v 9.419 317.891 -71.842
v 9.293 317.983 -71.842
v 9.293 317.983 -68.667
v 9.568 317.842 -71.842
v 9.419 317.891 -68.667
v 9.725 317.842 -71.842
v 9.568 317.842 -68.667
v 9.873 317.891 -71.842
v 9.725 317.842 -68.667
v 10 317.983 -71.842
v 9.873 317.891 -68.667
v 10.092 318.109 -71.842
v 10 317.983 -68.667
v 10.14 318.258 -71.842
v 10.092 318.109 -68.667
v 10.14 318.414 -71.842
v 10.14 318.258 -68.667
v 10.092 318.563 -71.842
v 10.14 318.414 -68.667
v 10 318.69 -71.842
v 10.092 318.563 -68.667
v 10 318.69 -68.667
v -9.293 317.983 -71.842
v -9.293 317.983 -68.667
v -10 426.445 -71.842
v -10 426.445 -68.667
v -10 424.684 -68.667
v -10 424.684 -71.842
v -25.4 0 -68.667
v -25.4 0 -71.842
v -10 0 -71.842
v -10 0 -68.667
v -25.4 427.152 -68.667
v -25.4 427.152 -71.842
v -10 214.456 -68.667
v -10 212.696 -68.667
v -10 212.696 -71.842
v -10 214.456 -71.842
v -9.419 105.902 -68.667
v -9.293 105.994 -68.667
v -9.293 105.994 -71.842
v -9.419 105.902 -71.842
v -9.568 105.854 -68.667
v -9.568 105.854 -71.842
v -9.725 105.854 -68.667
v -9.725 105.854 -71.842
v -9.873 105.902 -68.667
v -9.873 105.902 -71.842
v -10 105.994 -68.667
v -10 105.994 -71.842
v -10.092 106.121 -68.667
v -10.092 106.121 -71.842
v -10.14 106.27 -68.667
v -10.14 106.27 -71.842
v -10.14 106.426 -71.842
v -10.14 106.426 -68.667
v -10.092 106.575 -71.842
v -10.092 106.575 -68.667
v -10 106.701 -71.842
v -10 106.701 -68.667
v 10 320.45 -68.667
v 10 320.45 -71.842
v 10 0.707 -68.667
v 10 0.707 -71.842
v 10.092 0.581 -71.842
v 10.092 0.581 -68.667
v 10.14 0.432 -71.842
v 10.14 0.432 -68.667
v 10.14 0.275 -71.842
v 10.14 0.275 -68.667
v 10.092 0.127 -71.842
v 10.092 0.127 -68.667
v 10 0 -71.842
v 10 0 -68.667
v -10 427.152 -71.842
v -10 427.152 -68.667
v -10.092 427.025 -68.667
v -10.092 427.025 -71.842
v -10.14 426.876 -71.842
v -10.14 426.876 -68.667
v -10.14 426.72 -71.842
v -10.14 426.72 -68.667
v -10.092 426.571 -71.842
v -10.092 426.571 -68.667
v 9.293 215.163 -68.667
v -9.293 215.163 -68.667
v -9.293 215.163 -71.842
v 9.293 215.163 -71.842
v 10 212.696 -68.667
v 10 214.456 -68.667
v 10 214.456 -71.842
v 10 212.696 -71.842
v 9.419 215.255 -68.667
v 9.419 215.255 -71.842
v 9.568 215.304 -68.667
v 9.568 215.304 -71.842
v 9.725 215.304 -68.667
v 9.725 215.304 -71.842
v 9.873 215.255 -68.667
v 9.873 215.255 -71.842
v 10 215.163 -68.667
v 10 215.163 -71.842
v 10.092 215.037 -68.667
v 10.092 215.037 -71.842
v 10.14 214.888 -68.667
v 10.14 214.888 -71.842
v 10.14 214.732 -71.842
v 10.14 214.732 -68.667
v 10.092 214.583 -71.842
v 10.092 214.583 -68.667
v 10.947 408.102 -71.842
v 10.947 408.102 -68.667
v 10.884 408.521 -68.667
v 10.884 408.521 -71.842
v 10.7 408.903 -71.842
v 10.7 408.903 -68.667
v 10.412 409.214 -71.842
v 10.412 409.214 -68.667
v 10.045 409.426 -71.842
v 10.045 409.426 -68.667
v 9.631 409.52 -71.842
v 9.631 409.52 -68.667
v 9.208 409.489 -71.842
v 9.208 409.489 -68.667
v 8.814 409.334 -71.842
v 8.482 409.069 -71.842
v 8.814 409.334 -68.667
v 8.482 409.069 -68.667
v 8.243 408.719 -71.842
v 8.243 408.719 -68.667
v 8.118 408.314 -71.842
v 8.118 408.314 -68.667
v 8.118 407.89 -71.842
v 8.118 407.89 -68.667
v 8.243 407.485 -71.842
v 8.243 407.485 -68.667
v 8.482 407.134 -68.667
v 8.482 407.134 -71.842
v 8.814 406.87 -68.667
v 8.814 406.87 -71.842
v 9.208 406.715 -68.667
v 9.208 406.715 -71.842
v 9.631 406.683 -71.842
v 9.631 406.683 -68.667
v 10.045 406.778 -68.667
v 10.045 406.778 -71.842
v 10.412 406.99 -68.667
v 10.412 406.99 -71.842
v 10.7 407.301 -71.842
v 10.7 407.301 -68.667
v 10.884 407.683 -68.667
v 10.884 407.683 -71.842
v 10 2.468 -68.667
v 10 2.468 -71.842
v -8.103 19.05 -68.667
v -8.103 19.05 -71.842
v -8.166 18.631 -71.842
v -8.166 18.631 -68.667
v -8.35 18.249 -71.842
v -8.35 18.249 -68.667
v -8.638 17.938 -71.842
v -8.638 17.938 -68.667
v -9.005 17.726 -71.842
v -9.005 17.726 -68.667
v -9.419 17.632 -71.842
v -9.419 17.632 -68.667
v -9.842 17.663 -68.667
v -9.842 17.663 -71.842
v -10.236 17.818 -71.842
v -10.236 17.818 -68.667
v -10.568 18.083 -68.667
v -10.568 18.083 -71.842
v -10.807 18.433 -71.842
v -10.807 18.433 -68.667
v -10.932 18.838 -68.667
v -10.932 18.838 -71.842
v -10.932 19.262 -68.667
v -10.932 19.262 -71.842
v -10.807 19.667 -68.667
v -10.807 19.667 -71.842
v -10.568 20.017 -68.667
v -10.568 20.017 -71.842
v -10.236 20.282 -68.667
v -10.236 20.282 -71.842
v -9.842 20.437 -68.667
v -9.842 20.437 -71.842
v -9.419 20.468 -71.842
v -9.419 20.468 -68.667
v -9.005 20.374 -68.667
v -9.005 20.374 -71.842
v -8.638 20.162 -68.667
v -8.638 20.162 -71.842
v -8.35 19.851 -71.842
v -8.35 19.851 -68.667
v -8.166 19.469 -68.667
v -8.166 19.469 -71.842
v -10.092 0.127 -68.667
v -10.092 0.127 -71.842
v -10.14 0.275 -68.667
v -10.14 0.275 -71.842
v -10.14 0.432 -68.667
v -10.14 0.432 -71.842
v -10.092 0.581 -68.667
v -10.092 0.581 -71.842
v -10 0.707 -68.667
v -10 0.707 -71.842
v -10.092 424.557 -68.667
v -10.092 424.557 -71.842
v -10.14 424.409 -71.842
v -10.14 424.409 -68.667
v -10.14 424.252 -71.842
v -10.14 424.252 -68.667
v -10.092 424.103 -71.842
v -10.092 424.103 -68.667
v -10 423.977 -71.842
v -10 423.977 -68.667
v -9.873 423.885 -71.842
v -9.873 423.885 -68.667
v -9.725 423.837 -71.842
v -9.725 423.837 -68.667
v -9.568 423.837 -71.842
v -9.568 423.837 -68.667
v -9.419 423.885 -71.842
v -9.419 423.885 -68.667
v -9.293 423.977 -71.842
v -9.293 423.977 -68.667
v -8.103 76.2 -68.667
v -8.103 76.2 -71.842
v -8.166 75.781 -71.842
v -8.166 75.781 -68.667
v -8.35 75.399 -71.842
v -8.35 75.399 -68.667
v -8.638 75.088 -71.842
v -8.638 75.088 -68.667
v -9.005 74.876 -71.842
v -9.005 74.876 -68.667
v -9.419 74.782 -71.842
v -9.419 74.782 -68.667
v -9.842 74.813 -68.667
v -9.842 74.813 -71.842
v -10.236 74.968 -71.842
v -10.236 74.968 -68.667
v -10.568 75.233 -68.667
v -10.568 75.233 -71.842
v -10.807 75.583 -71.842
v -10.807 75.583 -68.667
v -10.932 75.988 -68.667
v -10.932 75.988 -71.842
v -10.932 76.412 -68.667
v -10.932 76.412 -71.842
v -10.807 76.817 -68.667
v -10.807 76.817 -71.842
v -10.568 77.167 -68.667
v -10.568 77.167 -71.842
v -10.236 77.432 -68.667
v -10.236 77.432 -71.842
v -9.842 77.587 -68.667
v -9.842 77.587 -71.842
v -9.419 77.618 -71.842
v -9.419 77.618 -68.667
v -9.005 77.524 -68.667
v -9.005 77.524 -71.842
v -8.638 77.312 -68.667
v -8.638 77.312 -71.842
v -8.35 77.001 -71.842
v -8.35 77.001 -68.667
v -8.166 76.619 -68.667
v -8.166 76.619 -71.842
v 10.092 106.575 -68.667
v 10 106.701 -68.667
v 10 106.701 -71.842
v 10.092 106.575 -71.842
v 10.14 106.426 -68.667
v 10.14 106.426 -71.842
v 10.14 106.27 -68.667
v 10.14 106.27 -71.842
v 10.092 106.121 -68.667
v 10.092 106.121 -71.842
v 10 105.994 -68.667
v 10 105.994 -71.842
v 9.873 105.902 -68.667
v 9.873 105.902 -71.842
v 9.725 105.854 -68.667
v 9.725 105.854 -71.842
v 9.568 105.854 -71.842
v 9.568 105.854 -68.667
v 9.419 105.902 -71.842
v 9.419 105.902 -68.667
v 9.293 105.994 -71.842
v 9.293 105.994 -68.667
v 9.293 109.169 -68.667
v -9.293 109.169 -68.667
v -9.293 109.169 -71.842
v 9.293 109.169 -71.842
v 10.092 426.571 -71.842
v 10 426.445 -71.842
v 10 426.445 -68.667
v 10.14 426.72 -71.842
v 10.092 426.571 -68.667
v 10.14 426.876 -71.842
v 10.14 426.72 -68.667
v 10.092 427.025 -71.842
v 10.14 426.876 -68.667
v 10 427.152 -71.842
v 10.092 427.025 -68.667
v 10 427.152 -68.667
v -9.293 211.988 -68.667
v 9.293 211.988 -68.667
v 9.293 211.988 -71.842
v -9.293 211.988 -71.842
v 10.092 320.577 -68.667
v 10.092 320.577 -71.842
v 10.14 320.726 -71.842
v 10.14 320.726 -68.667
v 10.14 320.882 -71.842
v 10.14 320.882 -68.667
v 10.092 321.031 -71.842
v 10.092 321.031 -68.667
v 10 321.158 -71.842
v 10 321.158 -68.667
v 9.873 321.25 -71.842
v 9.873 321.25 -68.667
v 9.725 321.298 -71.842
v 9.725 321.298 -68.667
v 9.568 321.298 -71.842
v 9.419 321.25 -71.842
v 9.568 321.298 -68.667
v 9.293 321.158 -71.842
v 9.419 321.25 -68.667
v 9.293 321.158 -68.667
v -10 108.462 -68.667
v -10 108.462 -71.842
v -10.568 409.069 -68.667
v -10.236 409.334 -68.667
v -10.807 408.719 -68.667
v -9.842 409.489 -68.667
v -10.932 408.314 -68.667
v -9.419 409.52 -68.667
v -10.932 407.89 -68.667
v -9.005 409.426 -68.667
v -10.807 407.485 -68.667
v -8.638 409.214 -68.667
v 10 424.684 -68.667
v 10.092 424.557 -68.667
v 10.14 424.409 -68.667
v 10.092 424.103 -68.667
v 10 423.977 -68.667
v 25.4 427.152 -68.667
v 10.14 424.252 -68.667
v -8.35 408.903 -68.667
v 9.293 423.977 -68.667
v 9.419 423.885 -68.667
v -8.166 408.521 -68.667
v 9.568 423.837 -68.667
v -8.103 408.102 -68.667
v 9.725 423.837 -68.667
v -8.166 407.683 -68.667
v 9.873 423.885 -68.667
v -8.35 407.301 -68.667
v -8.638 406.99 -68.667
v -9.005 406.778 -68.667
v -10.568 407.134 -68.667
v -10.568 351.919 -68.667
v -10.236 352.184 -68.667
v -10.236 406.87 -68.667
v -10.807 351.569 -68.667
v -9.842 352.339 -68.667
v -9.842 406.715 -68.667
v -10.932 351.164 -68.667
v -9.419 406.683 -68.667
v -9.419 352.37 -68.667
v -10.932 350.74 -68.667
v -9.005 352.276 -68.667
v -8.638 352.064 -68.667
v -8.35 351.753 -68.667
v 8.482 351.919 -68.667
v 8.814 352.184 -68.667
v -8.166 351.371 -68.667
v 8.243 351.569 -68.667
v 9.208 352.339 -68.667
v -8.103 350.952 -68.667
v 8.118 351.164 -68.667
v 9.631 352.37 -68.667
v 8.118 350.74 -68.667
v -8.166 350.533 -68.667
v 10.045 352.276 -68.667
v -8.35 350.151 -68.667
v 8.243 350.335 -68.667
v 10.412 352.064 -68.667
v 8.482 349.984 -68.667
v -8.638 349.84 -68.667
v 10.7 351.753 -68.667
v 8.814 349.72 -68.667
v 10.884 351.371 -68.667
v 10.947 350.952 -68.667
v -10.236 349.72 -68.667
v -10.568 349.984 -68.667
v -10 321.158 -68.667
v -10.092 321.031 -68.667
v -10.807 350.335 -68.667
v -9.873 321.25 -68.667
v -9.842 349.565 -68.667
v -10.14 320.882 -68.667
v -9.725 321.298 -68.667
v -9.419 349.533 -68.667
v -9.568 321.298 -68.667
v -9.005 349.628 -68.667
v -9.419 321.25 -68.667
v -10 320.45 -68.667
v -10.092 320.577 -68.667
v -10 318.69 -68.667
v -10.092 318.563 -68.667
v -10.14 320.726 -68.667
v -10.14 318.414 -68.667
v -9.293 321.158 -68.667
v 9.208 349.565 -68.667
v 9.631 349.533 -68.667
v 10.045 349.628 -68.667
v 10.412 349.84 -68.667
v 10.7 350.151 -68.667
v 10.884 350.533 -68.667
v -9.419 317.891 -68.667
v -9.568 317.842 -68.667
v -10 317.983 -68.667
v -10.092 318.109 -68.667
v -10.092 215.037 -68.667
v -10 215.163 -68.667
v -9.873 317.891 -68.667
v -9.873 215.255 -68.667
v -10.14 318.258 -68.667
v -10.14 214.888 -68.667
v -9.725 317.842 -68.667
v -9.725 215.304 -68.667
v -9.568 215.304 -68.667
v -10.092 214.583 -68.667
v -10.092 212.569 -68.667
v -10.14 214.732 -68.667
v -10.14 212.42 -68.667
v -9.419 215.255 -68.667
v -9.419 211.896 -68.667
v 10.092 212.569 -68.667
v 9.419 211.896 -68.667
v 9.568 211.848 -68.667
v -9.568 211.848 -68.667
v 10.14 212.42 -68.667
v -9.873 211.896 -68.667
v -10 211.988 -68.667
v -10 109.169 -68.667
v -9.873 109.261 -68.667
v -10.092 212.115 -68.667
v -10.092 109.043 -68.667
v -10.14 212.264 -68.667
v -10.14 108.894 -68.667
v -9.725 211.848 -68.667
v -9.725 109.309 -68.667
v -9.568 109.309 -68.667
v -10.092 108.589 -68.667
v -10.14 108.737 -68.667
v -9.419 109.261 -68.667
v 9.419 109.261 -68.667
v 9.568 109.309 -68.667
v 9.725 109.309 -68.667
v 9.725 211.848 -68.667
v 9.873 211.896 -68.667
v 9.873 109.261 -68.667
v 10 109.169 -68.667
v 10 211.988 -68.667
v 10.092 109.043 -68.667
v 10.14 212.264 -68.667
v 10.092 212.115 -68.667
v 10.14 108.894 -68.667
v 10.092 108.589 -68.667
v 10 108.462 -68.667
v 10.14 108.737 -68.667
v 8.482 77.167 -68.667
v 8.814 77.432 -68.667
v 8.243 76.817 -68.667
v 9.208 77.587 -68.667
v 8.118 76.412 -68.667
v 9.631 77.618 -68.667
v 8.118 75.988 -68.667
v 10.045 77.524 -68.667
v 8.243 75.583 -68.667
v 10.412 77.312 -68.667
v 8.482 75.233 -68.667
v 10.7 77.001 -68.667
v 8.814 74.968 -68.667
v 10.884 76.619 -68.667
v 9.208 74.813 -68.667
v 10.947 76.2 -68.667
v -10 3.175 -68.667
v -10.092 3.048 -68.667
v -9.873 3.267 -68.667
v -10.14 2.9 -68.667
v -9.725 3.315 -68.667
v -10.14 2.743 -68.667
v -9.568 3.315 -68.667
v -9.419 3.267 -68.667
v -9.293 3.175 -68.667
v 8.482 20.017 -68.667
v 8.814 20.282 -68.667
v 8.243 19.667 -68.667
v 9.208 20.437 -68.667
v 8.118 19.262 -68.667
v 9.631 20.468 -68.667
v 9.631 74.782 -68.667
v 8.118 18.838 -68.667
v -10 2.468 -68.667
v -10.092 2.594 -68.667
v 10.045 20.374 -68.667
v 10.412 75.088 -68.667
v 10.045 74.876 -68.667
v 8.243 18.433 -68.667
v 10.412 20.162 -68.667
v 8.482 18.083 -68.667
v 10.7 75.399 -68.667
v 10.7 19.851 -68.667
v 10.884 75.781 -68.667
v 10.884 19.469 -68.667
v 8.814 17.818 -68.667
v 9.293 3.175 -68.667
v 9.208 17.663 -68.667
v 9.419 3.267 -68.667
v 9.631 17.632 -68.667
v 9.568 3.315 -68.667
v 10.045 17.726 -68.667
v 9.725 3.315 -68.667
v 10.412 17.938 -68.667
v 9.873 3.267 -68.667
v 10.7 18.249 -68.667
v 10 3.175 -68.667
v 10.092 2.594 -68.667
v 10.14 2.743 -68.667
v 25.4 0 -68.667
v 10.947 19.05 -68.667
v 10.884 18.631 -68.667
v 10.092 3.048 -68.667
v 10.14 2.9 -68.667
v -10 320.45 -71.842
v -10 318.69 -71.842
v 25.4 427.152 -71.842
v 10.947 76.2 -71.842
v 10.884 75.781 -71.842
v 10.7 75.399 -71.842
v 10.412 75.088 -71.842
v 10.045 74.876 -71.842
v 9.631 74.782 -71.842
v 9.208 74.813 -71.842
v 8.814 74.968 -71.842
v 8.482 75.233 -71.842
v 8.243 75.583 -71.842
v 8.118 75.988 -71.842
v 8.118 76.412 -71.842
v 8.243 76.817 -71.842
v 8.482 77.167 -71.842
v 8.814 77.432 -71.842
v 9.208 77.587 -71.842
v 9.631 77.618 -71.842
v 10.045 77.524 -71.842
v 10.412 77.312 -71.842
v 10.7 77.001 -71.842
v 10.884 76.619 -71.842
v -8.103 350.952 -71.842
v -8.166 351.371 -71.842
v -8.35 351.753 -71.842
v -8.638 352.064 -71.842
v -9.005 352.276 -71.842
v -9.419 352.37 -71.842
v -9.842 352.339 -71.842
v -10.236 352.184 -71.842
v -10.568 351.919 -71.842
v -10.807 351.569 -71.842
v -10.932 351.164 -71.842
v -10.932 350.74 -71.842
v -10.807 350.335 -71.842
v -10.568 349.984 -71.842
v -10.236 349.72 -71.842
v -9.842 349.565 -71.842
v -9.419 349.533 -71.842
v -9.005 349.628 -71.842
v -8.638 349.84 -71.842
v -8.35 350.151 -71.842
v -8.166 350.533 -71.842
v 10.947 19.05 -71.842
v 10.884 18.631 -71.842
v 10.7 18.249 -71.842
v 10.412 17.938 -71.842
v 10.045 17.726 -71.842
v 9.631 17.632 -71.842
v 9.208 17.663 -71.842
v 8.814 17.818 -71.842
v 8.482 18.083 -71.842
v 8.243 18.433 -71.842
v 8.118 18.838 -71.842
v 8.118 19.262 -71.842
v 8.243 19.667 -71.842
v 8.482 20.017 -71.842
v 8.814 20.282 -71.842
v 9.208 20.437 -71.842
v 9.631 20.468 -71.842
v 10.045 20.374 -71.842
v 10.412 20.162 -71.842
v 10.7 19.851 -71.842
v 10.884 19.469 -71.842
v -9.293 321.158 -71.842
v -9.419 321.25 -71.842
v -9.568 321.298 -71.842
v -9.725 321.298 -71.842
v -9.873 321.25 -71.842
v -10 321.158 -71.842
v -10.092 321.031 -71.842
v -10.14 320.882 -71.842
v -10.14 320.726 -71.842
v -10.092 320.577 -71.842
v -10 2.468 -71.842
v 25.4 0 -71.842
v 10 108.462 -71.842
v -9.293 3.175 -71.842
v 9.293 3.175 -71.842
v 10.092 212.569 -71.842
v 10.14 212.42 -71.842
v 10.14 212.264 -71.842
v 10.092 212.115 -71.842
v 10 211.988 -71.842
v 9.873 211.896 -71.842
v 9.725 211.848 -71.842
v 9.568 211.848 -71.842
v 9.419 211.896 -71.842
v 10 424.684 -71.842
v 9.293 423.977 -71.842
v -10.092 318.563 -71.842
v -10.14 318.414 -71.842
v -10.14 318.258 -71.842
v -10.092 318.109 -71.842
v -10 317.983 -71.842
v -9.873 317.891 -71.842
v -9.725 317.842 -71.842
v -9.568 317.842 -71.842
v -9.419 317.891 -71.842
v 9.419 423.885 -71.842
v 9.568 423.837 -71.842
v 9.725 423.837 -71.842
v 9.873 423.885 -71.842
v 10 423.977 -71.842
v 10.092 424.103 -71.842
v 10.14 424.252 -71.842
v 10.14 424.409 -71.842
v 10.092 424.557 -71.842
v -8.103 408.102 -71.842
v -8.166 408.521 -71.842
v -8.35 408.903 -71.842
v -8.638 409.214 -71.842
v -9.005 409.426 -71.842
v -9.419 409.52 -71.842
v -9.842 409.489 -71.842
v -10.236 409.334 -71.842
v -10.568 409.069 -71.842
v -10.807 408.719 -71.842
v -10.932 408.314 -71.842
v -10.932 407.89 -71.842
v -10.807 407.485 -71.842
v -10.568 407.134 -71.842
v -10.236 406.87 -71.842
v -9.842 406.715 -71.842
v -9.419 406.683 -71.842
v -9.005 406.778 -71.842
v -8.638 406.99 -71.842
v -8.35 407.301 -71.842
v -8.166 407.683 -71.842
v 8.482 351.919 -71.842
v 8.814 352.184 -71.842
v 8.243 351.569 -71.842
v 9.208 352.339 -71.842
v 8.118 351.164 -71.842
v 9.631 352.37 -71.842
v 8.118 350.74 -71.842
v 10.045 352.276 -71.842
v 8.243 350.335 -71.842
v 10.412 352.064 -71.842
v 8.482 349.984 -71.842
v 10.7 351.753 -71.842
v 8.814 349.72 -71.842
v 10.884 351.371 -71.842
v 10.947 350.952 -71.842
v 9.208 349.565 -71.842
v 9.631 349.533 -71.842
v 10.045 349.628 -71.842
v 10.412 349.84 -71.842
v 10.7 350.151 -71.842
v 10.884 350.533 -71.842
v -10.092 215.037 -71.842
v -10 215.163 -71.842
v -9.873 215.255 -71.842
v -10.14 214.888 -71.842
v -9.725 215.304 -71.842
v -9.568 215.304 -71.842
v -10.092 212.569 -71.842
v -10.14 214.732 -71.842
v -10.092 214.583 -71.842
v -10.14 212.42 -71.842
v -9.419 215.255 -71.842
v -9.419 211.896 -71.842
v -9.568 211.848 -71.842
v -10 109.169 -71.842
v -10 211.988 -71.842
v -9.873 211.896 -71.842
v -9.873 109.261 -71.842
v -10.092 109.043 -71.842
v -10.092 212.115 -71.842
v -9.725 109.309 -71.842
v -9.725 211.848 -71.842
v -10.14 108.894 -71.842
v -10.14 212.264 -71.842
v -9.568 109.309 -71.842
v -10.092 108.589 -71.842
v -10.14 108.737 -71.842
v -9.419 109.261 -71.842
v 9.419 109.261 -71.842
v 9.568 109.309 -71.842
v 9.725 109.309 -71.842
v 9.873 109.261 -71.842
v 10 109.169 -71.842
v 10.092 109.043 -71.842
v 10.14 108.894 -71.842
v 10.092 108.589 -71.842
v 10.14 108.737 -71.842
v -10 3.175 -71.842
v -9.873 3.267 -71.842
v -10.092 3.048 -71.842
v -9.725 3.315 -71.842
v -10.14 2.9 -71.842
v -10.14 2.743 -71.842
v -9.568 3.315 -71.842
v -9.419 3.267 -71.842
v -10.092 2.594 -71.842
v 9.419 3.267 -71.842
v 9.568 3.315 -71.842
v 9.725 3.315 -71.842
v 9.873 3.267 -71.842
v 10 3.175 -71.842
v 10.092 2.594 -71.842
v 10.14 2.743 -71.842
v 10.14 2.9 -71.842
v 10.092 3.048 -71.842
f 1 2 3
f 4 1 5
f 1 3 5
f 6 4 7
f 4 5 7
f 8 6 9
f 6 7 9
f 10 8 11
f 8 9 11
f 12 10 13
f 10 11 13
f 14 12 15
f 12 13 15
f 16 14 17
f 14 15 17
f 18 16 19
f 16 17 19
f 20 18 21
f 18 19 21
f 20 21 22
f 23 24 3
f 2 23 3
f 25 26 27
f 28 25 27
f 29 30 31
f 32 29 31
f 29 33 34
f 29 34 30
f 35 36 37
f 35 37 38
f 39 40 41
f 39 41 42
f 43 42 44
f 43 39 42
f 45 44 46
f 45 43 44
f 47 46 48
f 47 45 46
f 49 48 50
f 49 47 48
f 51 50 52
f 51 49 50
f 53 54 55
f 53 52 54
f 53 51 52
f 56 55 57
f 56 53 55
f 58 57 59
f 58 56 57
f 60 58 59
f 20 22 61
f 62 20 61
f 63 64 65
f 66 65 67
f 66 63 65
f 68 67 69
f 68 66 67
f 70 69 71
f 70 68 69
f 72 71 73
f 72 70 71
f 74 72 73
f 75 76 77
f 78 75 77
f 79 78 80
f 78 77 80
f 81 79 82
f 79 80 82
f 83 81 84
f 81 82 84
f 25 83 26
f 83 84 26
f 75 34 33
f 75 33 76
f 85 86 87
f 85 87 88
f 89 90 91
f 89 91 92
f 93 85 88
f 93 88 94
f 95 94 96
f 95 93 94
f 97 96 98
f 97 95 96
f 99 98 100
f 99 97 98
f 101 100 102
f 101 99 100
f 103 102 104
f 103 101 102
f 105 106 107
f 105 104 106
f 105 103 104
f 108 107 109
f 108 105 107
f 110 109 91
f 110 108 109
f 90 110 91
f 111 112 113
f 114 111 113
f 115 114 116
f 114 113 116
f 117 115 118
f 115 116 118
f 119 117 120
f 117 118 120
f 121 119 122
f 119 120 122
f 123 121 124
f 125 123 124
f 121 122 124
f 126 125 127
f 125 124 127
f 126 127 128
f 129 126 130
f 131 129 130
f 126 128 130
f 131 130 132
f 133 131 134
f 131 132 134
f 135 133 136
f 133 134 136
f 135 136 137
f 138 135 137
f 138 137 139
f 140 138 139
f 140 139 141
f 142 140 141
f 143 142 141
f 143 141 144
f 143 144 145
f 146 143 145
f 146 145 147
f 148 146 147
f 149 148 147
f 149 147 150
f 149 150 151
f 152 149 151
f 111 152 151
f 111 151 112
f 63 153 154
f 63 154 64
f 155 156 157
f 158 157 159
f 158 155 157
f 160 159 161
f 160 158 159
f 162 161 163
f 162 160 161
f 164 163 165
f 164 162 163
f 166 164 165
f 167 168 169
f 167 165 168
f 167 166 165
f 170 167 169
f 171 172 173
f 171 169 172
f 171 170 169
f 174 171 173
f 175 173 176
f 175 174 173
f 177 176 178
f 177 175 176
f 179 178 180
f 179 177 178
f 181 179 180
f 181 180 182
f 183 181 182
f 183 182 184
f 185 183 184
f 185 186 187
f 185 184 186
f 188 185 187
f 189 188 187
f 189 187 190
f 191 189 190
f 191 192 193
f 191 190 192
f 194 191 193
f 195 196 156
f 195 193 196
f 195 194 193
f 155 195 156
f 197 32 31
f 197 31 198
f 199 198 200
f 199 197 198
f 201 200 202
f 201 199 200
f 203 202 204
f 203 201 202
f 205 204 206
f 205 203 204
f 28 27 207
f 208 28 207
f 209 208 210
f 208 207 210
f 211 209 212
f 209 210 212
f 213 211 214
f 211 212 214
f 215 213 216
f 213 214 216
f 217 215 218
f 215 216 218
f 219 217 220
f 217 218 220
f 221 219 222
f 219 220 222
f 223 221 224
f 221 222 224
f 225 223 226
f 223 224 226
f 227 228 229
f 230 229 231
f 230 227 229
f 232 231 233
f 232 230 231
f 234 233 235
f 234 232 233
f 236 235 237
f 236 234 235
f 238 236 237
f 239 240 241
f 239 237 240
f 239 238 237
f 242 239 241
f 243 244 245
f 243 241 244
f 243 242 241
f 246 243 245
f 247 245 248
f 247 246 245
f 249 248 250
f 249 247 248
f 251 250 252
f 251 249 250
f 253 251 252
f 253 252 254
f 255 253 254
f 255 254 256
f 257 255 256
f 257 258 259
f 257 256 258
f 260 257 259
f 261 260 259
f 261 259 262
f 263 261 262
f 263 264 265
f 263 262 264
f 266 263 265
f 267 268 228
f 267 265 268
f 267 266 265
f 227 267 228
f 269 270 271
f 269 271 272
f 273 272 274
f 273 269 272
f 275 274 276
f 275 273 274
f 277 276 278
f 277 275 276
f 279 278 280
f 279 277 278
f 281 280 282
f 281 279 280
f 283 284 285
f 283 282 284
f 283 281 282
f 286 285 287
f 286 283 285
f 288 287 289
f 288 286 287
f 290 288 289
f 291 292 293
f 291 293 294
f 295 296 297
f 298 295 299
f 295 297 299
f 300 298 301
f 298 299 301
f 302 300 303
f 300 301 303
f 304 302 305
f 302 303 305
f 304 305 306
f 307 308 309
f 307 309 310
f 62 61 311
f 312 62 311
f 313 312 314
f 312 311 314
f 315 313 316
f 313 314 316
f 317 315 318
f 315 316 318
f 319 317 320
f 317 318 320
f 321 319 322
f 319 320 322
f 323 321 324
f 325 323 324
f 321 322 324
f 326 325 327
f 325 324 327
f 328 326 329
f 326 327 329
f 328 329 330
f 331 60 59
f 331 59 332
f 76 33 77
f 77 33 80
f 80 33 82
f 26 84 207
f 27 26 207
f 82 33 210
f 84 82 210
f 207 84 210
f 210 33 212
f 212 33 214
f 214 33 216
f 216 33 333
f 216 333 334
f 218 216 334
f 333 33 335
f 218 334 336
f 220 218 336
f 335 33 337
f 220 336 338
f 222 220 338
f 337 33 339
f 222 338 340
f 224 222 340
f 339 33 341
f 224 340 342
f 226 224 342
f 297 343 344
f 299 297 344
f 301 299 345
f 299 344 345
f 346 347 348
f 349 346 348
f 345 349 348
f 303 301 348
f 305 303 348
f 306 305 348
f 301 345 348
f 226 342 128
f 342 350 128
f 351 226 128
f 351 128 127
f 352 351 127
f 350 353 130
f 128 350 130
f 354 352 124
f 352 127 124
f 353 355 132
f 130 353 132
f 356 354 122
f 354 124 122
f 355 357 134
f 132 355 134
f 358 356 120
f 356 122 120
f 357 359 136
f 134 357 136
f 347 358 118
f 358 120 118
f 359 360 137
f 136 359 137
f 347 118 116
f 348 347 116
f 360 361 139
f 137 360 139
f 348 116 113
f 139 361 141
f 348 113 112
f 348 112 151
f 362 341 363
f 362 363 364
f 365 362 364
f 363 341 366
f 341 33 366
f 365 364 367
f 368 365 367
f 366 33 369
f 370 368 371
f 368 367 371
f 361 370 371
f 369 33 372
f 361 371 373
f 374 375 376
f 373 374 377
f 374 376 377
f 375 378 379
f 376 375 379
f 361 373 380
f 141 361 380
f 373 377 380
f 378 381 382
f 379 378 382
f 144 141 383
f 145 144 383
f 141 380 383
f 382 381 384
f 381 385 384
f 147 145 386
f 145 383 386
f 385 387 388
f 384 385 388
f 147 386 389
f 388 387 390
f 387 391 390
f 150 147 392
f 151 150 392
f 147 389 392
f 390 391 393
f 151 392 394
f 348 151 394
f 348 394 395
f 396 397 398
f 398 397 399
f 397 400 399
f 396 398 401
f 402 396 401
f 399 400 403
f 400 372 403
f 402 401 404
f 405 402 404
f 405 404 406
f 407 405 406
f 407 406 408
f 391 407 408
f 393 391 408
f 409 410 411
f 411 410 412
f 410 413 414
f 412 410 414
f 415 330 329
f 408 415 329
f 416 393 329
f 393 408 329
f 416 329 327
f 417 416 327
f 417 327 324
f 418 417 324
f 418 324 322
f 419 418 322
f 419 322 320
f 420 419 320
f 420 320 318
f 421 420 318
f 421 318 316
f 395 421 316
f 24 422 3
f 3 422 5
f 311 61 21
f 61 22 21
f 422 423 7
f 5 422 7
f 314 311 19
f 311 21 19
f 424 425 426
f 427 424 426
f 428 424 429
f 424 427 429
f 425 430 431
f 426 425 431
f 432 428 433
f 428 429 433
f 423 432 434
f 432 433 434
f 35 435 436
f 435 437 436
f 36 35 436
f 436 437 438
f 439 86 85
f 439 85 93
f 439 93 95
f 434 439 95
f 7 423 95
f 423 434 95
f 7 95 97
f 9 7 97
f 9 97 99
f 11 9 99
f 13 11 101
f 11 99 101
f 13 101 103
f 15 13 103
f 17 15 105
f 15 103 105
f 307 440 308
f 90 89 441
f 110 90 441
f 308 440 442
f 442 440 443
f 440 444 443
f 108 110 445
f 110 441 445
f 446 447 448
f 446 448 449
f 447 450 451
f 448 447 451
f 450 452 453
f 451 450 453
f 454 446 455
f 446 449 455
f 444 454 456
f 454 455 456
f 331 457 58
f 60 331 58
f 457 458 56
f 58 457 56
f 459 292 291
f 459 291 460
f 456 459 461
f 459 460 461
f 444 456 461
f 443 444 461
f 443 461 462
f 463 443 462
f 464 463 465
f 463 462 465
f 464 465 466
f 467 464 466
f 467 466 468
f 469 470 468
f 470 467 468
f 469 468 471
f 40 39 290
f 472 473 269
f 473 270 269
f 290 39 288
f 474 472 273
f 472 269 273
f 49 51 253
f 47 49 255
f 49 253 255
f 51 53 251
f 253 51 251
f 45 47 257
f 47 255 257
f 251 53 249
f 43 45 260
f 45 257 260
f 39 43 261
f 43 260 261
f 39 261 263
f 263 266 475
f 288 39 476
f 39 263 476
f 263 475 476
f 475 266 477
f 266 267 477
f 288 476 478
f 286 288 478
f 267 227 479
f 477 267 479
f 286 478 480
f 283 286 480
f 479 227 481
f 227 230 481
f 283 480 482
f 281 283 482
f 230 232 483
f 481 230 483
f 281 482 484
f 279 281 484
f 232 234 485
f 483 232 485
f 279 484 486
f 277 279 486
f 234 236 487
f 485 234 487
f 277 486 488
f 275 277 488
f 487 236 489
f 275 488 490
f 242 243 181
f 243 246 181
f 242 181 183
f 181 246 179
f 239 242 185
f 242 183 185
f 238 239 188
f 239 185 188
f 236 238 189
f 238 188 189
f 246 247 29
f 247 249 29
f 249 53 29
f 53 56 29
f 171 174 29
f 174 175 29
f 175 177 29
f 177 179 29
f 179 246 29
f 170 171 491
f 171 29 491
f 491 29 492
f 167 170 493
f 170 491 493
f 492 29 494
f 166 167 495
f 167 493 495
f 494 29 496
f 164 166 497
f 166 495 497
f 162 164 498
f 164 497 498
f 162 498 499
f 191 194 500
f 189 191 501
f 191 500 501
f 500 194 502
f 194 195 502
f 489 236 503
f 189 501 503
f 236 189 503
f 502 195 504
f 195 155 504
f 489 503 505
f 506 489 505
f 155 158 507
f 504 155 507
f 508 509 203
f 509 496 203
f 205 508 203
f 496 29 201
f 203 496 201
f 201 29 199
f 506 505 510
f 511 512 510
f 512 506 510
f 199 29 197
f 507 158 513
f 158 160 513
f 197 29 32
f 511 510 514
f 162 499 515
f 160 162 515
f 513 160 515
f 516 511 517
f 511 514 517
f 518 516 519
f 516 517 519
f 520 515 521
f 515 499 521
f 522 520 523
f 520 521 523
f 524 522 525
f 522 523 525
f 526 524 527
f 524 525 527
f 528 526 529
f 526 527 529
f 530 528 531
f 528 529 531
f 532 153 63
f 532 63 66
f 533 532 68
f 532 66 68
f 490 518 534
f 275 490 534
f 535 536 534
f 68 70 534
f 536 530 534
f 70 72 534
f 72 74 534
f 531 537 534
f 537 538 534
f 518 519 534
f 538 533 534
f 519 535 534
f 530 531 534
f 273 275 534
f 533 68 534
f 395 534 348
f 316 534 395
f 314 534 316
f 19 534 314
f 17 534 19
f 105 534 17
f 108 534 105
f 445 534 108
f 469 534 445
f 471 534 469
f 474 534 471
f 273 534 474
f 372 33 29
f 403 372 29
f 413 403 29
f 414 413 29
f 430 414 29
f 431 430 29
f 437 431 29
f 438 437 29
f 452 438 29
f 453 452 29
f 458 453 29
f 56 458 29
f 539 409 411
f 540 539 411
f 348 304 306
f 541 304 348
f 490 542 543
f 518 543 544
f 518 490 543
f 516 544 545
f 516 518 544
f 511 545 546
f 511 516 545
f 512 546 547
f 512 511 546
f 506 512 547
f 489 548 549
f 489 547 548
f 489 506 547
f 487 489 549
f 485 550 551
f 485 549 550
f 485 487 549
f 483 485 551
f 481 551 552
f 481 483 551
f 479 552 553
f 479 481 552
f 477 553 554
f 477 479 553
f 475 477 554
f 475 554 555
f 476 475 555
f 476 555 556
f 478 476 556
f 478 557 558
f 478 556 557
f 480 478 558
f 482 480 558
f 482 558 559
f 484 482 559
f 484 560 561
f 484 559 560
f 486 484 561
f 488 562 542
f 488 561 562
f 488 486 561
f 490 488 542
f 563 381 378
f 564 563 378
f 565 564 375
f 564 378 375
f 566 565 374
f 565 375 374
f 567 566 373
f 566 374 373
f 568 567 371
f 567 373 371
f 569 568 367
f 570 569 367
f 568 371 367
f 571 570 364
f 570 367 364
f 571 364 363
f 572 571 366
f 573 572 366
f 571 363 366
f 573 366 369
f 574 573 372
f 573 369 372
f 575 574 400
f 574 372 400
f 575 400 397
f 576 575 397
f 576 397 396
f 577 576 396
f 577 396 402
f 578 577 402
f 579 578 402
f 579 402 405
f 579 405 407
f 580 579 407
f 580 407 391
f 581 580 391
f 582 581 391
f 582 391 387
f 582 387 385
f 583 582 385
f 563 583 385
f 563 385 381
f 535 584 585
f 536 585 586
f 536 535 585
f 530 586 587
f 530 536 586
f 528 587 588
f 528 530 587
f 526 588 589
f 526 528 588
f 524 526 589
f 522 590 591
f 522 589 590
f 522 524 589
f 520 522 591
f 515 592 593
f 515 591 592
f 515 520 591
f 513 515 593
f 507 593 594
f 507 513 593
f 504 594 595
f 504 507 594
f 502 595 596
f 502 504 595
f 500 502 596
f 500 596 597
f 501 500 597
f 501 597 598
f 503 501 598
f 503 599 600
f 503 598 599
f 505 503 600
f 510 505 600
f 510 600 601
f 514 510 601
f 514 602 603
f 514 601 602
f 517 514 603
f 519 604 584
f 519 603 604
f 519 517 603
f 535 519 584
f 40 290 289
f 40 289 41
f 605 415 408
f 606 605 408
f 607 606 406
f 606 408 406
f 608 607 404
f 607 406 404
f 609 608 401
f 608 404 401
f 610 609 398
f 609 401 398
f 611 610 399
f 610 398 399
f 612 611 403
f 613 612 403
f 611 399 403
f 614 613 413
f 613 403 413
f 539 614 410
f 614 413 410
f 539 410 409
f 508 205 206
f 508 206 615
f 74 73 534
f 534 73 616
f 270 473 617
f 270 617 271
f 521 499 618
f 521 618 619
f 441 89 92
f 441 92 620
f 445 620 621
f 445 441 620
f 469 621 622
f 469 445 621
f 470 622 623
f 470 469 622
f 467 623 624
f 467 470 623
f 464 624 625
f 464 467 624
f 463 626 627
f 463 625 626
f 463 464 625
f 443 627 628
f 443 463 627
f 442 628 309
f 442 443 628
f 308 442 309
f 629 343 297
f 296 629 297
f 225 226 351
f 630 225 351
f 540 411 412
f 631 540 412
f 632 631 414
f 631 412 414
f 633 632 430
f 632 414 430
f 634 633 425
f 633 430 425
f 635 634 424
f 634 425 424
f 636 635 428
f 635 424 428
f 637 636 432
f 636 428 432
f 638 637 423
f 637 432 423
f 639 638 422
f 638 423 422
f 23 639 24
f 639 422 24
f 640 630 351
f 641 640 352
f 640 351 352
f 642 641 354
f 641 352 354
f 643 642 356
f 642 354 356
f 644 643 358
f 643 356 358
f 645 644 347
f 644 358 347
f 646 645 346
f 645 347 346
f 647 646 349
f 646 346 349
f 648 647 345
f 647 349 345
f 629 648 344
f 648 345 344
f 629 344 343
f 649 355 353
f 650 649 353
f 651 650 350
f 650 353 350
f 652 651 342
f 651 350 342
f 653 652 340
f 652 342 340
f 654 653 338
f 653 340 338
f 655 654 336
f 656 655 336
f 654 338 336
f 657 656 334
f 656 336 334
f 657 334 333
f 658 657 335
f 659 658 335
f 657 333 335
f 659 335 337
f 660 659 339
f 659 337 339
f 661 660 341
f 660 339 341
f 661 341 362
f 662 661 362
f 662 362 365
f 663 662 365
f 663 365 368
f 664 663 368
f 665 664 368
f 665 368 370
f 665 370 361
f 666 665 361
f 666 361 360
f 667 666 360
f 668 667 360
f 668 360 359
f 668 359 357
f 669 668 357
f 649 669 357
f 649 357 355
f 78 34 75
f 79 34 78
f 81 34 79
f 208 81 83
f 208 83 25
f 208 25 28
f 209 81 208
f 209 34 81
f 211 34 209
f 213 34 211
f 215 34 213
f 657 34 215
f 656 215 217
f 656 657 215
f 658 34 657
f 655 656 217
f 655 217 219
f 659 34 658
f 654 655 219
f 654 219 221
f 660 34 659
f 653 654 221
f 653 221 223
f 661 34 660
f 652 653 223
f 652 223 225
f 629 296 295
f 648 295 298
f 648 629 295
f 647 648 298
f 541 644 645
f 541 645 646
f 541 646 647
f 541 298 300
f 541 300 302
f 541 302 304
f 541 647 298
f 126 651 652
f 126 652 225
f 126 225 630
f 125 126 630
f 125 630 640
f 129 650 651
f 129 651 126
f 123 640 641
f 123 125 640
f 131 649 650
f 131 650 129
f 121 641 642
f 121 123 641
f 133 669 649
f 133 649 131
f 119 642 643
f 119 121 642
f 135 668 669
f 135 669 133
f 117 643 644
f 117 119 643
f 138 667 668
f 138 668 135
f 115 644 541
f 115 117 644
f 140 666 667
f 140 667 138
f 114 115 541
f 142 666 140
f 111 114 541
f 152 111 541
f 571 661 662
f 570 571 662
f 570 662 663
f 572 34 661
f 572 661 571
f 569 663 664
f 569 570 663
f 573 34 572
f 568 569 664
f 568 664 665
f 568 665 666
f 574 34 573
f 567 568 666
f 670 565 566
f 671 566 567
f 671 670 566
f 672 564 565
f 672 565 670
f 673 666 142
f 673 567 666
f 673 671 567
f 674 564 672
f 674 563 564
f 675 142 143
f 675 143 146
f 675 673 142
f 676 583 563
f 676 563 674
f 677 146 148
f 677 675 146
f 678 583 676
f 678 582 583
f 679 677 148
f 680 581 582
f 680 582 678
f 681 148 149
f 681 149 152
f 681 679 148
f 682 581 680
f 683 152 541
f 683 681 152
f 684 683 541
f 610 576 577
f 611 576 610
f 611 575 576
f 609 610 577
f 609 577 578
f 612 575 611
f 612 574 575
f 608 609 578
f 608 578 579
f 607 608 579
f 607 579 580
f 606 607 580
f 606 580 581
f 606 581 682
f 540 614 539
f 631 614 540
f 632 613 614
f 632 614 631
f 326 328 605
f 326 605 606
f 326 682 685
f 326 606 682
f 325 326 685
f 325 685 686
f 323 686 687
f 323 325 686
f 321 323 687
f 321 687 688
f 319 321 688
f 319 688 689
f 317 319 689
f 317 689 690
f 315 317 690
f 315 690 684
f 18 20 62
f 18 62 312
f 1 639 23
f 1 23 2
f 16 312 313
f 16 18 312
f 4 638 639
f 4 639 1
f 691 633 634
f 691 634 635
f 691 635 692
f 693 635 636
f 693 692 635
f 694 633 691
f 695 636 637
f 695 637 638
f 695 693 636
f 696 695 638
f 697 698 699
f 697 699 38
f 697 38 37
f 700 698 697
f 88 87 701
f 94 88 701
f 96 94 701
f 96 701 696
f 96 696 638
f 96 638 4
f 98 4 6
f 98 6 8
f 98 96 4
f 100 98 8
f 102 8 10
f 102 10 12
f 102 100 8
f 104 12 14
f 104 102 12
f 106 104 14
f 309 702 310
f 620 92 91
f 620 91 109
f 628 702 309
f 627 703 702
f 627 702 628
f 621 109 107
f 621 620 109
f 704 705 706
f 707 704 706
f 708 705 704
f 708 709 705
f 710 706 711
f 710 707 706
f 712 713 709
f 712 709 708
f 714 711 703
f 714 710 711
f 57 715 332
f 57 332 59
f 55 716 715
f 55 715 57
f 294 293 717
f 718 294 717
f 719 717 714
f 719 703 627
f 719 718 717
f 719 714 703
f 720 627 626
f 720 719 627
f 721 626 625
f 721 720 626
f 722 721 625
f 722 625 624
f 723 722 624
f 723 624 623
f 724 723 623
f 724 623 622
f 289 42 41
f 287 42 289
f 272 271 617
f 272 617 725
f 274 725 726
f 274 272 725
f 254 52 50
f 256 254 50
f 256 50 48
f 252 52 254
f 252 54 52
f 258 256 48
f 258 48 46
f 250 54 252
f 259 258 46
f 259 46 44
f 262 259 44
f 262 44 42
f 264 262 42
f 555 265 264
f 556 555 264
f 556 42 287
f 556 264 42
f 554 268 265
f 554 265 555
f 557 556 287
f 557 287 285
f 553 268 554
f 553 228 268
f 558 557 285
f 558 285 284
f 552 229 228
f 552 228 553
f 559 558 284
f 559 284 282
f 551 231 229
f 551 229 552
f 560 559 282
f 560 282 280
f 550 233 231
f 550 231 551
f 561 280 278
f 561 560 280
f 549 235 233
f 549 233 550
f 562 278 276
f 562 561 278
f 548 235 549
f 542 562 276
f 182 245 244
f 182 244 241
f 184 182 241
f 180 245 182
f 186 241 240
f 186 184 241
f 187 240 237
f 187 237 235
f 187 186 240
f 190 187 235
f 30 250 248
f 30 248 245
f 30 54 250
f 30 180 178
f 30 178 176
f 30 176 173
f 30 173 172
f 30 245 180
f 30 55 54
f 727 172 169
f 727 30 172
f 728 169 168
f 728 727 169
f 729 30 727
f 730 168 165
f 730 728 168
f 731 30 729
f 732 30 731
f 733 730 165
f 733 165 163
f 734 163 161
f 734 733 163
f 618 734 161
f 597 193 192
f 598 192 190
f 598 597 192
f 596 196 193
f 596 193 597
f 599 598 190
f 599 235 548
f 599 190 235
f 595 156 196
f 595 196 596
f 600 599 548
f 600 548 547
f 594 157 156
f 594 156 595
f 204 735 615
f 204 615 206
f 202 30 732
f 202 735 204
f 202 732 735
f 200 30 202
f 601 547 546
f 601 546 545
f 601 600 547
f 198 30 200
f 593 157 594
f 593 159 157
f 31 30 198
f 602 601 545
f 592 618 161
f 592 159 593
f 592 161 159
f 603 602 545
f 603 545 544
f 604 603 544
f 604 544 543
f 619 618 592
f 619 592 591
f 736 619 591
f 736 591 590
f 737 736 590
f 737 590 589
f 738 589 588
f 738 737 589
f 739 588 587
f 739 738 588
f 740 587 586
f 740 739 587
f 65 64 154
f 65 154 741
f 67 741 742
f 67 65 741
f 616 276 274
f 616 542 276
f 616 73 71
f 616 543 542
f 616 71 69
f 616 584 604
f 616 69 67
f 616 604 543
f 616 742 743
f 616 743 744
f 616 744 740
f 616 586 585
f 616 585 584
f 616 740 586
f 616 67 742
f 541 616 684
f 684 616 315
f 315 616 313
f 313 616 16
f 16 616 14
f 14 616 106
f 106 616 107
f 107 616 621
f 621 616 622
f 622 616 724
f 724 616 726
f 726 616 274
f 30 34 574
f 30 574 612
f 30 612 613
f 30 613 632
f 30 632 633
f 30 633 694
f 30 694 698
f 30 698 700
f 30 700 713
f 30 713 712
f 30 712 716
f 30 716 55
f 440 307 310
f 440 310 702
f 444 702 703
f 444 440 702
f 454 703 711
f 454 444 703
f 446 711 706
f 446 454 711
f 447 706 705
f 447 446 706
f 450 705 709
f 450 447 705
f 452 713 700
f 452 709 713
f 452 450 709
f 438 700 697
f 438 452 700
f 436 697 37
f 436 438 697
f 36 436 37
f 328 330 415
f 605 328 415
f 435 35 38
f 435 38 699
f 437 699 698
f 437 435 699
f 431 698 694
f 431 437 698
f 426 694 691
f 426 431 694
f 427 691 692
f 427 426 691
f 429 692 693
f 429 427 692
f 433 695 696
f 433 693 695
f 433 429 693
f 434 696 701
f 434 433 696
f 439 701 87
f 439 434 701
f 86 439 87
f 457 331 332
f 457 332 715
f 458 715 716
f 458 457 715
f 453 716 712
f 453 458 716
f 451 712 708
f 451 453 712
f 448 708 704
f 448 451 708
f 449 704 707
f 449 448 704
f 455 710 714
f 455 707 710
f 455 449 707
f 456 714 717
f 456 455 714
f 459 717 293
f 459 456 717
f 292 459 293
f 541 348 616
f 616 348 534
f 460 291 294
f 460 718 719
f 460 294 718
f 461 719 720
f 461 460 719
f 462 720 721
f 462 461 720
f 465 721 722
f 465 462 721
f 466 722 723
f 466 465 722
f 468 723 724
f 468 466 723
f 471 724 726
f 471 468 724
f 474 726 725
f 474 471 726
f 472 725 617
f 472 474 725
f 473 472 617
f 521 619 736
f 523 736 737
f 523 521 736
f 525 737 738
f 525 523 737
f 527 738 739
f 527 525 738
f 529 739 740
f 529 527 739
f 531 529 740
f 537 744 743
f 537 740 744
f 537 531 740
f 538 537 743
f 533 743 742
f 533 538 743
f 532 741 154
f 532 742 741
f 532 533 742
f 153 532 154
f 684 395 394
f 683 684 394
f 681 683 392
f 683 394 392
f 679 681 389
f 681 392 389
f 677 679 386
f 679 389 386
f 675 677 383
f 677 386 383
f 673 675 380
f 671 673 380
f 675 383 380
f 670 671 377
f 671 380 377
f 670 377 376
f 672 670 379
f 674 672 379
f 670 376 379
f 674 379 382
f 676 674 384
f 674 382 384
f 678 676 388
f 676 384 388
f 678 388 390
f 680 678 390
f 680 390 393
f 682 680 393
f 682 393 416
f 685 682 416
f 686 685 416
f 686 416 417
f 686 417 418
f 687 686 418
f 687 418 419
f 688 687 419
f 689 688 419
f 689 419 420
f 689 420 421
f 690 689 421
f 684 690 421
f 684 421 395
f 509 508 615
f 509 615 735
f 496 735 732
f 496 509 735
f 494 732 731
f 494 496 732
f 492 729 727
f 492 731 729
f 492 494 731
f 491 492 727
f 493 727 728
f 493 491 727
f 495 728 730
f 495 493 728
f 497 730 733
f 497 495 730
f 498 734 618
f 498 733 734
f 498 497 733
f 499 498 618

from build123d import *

# Parameters (mm, degrees)
SKETCH1_W           = 50.8
SKETCH1_H           = 3.175
BOSS_EXTRUDE1_DEPTH = 427.1518
SKETCH4_R           = 1.4224
CUT_EXTRUDE2_DEPTH  = 5.08
SKETCH5_W           = 12.58267919
SKETCH5_H           = 101.029760921
BOSS_EXTRUDE2_DEPTH = 3.175
SKETCH6_W           = 7.546607927
SKETCH6_H           = 108.671154153
SKETCH6_W_2         = 9.055929513
BOSS_EXTRUDE3_DEPTH = 3.175
SKETCH7_W           = 50.8
SKETCH7_H           = 16.51
BOSS_EXTRUDE4_DEPTH = 3.175
SKETCH8_W           = 50.8
SKETCH8_H           = 51.188017092
BOSS_EXTRUDE5_DEPTH = 3.175
SKETCH9_W           = 50.8
SKETCH9_H           = 70.169066632
BOSS_EXTRUDE6_DEPTH = 3.175
CUT_EXTRUDE3_DEPTH  = 428.918100655


with BuildPart() as part:
    # Sketch1 → Boss-Extrude1 (new body)
    with BuildSketch(Plane(origin=(0, 0, 0), x_dir=(1, 0, 0), z_dir=(0, 1, 0))):
        with Locations((0, 70.254548969)):
            Rectangle(SKETCH1_W, SKETCH1_H)
    extrude(amount=BOSS_EXTRUDE1_DEPTH)

    # Sketch4 → Cut-Extrude2 (cut)
    with BuildSketch(Plane.XY.offset(-68.667048969)):
        with Locations((-3.175, 376.3518)):
            Circle(SKETCH4_R)
        with Locations((-9.525, 376.3518)):
            Circle(SKETCH4_R)
        with Locations((-9.525, 370.0018)):
            Circle(SKETCH4_R)
        with Locations((-9.525, 363.6518)):
            Circle(SKETCH4_R)
        with Locations((-9.525, 357.3018)):
            Circle(SKETCH4_R)
        with Locations((-9.525, 350.9518)):
            Circle(SKETCH4_R)
        with Locations((-9.525, 344.6018)):
            Circle(SKETCH4_R)
        with Locations((-9.525, 338.2518)):
            Circle(SKETCH4_R)
        with Locations((-9.525, 331.9018)):
            Circle(SKETCH4_R)
        with Locations((-9.525, 325.5518)):
            Circle(SKETCH4_R)
        with Locations((-9.525, 319.2018)):
            Circle(SKETCH4_R)
        with Locations((-9.525, 312.8518)):
            Circle(SKETCH4_R)
        with Locations((-9.525, 306.5018)):
            Circle(SKETCH4_R)
        with Locations((-9.525, 300.1518)):
            Circle(SKETCH4_R)
        with Locations((-9.525, 293.8018)):
            Circle(SKETCH4_R)
        with Locations((-9.525, 287.4518)):
            Circle(SKETCH4_R)
        with Locations((-9.525, 281.1018)):
            Circle(SKETCH4_R)
        with Locations((-3.175, 370.0018)):
            Circle(SKETCH4_R)
        with Locations((-3.175, 363.6518)):
            Circle(SKETCH4_R)
        with Locations((-3.175, 357.3018)):
            Circle(SKETCH4_R)
        with Locations((-3.175, 350.9518)):
            Circle(SKETCH4_R)
        with Locations((-3.175, 344.6018)):
            Circle(SKETCH4_R)
        with Locations((-3.175, 338.2518)):
            Circle(SKETCH4_R)
        with Locations((-3.175, 331.9018)):
            Circle(SKETCH4_R)
        with Locations((-3.175, 325.5518)):
            Circle(SKETCH4_R)
        with Locations((-3.175, 319.2018)):
            Circle(SKETCH4_R)
        with Locations((-3.175, 312.8518)):
            Circle(SKETCH4_R)
        with Locations((-3.175, 306.5018)):
            Circle(SKETCH4_R)
        with Locations((-3.175, 300.1518)):
            Circle(SKETCH4_R)
        with Locations((-3.175, 293.8018)):
            Circle(SKETCH4_R)
        with Locations((-3.175, 287.4518)):
            Circle(SKETCH4_R)
        with Locations((-3.175, 281.1018)):
            Circle(SKETCH4_R)
        with Locations((3.175, 281.1018)):
            Circle(SKETCH4_R)
        with Locations((3.175, 287.4518)):
            Circle(SKETCH4_R)
        with Locations((3.175, 293.8018)):
            Circle(SKETCH4_R)
        with Locations((3.175, 300.1518)):
            Circle(SKETCH4_R)
        with Locations((3.175, 306.5018)):
            Circle(SKETCH4_R)
        with Locations((3.175, 312.8518)):
            Circle(SKETCH4_R)
        with Locations((3.175, 319.2018)):
            Circle(SKETCH4_R)
        with Locations((3.175, 325.5518)):
            Circle(SKETCH4_R)
        with Locations((3.175, 331.9018)):
            Circle(SKETCH4_R)
        with Locations((3.175, 338.2518)):
            Circle(SKETCH4_R)
        with Locations((3.175, 344.6018)):
            Circle(SKETCH4_R)
        with Locations((3.175, 350.9518)):
            Circle(SKETCH4_R)
        with Locations((3.175, 357.3018)):
            Circle(SKETCH4_R)
        with Locations((3.175, 363.6518)):
            Circle(SKETCH4_R)
        with Locations((3.175, 370.0018)):
            Circle(SKETCH4_R)
        with Locations((9.525, 281.1018)):
            Circle(SKETCH4_R)
        with Locations((9.525, 287.4518)):
            Circle(SKETCH4_R)
        with Locations((9.525, 293.8018)):
            Circle(SKETCH4_R)
        with Locations((9.525, 300.1518)):
            Circle(SKETCH4_R)
        with Locations((9.525, 306.5018)):
            Circle(SKETCH4_R)
        with Locations((9.525, 312.8518)):
            Circle(SKETCH4_R)
        with Locations((9.525, 319.2018)):
            Circle(SKETCH4_R)
        with Locations((9.525, 325.5518)):
            Circle(SKETCH4_R)
        with Locations((9.525, 331.9018)):
            Circle(SKETCH4_R)
        with Locations((9.525, 338.2518)):
            Circle(SKETCH4_R)
        with Locations((9.525, 344.6018)):
            Circle(SKETCH4_R)
        with Locations((9.525, 350.9518)):
            Circle(SKETCH4_R)
        with Locations((9.525, 357.3018)):
            Circle(SKETCH4_R)
        with Locations((9.525, 363.6518)):
            Circle(SKETCH4_R)
        with Locations((9.525, 370.0018)):
            Circle(SKETCH4_R)
        with Locations((9.525, 376.3518)):
            Circle(SKETCH4_R)
        with Locations((3.175, 376.3518)):
            Circle(SKETCH4_R)
        with Locations((-9.525, 382.7018)):
            Circle(SKETCH4_R)
        with Locations((9.525, 382.7018)):
            Circle(SKETCH4_R)
        with Locations((-9.525, 389.0518)):
            Circle(SKETCH4_R)
        with Locations((9.525, 389.0518)):
            Circle(SKETCH4_R)
        with Locations((-9.525, 395.4018)):
            Circle(SKETCH4_R)
        with Locations((9.525, 395.4018)):
            Circle(SKETCH4_R)
        with Locations((-9.525, 401.7518)):
            Circle(SKETCH4_R)
        with Locations((9.525, 401.7518)):
            Circle(SKETCH4_R)
        with Locations((-9.525, 408.1018)):
            Circle(SKETCH4_R)
        with Locations((9.525, 408.1018)):
            Circle(SKETCH4_R)
        with Locations((-9.525, 414.4518)):
            Circle(SKETCH4_R)
        with Locations((9.525, 414.4518)):
            Circle(SKETCH4_R)
    cut_extrude2 = extrude(amount=-CUT_EXTRUDE2_DEPTH, mode=Mode.SUBTRACT)

    # Sketch5 → Boss-Extrude2 (add)
    with BuildSketch(Plane.XY.offset(-68.667048969)):
        with Locations((-0.175223229, 328.362881378)):
            Rectangle(SKETCH5_W, SKETCH5_H)
    boss_extrude2 = extrude(amount=-BOSS_EXTRUDE2_DEPTH)

    # Sketch6 → Boss-Extrude3 (add)
    with BuildSketch(Plane.XY.offset(-68.667048969)):
        with Locations((-16.484092579, 326.705642943)):
            Rectangle(SKETCH6_W, SKETCH6_H)
        with Locations((16.9725359, 326.705642943)):
            Rectangle(SKETCH6_W_2, SKETCH6_H)
    boss_extrude3 = extrude(amount=-BOSS_EXTRUDE3_DEPTH)

    # Sketch7 → Boss-Extrude4 (add)
    with BuildSketch(Plane.XY.offset(-68.667048969)):
        with Locations((0, 418.8968)):
            Rectangle(SKETCH7_W, SKETCH7_H)
    boss_extrude4 = extrude(amount=-BOSS_EXTRUDE4_DEPTH)

    # Sketch8 → Boss-Extrude5 (add)
    with BuildSketch(Plane.XY.offset(-68.667048969)):
        with Locations((0, 379.332910144)):
            Rectangle(SKETCH8_W, SKETCH8_H)
    boss_extrude5 = extrude(amount=-BOSS_EXTRUDE5_DEPTH)

    # Sketch9 → Boss-Extrude6 (add)
    with BuildSketch(Plane.XY.offset(-68.667048969)):
        with Locations((0, 312.515447534)):
            Rectangle(SKETCH9_W, SKETCH9_H)
    boss_extrude6 = extrude(amount=-BOSS_EXTRUDE6_DEPTH)

    # Mirror1: Cut-Extrude2, Boss-Extrude2, Boss-Extrude3, Boss-Extrude4, Boss-Extrude5, Boss-Extrude6 across plane
    add(cut_extrude2.mirror(Plane.ZX.offset(213.5759)), mode=Mode.SUBTRACT)
    add(boss_extrude2.mirror(Plane.ZX.offset(213.5759)))
    add(boss_extrude3.mirror(Plane.ZX.offset(213.5759)))
    add(boss_extrude4.mirror(Plane.ZX.offset(213.5759)))
    add(boss_extrude5.mirror(Plane.ZX.offset(213.5759)))
    add(boss_extrude6.mirror(Plane.ZX.offset(213.5759)))

    # Sketch11 → Cut-Extrude3 (cut, through all)
    with BuildSketch(Plane.XY.offset(-68.667048969)):
        with BuildLine():
            Line((9.292893219, 105.9942), (-9.292893219, 105.9942))
            ThreePointArc((-9.292893219, 105.9942), (-10, 105.9942), (-10, 106.701306781))
            Line((-10, 106.701306781), (-10, 108.462093219))
            ThreePointArc((-10, 108.462093219), (-10, 109.1692), (-9.292893219, 109.1692))
            Line((-9.292893219, 109.1692), (9.292893219, 109.1692))
            ThreePointArc((9.292893219, 109.1692), (10, 109.1692), (10, 108.462093219))
            Line((10, 108.462093219), (10, 106.701306781))
            ThreePointArc((10, 106.701306781), (10, 105.9942), (9.292893219, 105.9942))
        make_face()
        with BuildLine():
            Line((9.292893219, 0), (-9.292893219, 0))
            ThreePointArc((-9.292893219, 0), (-10, 0), (-10, 0.707106781))
            Line((-10, 0.707106781), (-10, 2.467893219))
            ThreePointArc((-10, 2.467893219), (-10, 3.175), (-9.292893219, 3.175))
            Line((-9.292893219, 3.175), (9.292893219, 3.175))
            ThreePointArc((9.292893219, 3.175), (10, 3.175), (10, 2.467893219))
            Line((10, 2.467893219), (10, 0.707106781))
            ThreePointArc((10, 0.707106781), (10, 0), (9.292893219, 0))
        make_face()
        with BuildLine():
            Line((9.292893219, 211.9884), (-9.292893219, 211.9884))
            ThreePointArc((-9.292893219, 211.9884), (-10, 211.9884), (-10, 212.695506781))
            Line((-10, 212.695506781), (-10, 214.456293219))
            ThreePointArc((-10, 214.456293219), (-10, 215.1634), (-9.292893219, 215.1634))
            Line((-9.292893219, 215.1634), (9.292893219, 215.1634))
            ThreePointArc((9.292893219, 215.1634), (10, 215.1634), (10, 214.456293219))
            Line((10, 214.456293219), (10, 212.695506781))
            ThreePointArc((10, 212.695506781), (10, 211.9884), (9.292893219, 211.9884))
        make_face()
    cut_extrude3 = extrude(amount=-CUT_EXTRUDE3_DEPTH, mode=Mode.SUBTRACT)

    # Mirror2: Cut-Extrude3 across plane
    add(cut_extrude3.mirror(Plane(origin=(0, 213.5759, 0), x_dir=(0, 0, 1), z_dir=(0, -1, 0))), mode=Mode.SUBTRACT)


solid = part.part
